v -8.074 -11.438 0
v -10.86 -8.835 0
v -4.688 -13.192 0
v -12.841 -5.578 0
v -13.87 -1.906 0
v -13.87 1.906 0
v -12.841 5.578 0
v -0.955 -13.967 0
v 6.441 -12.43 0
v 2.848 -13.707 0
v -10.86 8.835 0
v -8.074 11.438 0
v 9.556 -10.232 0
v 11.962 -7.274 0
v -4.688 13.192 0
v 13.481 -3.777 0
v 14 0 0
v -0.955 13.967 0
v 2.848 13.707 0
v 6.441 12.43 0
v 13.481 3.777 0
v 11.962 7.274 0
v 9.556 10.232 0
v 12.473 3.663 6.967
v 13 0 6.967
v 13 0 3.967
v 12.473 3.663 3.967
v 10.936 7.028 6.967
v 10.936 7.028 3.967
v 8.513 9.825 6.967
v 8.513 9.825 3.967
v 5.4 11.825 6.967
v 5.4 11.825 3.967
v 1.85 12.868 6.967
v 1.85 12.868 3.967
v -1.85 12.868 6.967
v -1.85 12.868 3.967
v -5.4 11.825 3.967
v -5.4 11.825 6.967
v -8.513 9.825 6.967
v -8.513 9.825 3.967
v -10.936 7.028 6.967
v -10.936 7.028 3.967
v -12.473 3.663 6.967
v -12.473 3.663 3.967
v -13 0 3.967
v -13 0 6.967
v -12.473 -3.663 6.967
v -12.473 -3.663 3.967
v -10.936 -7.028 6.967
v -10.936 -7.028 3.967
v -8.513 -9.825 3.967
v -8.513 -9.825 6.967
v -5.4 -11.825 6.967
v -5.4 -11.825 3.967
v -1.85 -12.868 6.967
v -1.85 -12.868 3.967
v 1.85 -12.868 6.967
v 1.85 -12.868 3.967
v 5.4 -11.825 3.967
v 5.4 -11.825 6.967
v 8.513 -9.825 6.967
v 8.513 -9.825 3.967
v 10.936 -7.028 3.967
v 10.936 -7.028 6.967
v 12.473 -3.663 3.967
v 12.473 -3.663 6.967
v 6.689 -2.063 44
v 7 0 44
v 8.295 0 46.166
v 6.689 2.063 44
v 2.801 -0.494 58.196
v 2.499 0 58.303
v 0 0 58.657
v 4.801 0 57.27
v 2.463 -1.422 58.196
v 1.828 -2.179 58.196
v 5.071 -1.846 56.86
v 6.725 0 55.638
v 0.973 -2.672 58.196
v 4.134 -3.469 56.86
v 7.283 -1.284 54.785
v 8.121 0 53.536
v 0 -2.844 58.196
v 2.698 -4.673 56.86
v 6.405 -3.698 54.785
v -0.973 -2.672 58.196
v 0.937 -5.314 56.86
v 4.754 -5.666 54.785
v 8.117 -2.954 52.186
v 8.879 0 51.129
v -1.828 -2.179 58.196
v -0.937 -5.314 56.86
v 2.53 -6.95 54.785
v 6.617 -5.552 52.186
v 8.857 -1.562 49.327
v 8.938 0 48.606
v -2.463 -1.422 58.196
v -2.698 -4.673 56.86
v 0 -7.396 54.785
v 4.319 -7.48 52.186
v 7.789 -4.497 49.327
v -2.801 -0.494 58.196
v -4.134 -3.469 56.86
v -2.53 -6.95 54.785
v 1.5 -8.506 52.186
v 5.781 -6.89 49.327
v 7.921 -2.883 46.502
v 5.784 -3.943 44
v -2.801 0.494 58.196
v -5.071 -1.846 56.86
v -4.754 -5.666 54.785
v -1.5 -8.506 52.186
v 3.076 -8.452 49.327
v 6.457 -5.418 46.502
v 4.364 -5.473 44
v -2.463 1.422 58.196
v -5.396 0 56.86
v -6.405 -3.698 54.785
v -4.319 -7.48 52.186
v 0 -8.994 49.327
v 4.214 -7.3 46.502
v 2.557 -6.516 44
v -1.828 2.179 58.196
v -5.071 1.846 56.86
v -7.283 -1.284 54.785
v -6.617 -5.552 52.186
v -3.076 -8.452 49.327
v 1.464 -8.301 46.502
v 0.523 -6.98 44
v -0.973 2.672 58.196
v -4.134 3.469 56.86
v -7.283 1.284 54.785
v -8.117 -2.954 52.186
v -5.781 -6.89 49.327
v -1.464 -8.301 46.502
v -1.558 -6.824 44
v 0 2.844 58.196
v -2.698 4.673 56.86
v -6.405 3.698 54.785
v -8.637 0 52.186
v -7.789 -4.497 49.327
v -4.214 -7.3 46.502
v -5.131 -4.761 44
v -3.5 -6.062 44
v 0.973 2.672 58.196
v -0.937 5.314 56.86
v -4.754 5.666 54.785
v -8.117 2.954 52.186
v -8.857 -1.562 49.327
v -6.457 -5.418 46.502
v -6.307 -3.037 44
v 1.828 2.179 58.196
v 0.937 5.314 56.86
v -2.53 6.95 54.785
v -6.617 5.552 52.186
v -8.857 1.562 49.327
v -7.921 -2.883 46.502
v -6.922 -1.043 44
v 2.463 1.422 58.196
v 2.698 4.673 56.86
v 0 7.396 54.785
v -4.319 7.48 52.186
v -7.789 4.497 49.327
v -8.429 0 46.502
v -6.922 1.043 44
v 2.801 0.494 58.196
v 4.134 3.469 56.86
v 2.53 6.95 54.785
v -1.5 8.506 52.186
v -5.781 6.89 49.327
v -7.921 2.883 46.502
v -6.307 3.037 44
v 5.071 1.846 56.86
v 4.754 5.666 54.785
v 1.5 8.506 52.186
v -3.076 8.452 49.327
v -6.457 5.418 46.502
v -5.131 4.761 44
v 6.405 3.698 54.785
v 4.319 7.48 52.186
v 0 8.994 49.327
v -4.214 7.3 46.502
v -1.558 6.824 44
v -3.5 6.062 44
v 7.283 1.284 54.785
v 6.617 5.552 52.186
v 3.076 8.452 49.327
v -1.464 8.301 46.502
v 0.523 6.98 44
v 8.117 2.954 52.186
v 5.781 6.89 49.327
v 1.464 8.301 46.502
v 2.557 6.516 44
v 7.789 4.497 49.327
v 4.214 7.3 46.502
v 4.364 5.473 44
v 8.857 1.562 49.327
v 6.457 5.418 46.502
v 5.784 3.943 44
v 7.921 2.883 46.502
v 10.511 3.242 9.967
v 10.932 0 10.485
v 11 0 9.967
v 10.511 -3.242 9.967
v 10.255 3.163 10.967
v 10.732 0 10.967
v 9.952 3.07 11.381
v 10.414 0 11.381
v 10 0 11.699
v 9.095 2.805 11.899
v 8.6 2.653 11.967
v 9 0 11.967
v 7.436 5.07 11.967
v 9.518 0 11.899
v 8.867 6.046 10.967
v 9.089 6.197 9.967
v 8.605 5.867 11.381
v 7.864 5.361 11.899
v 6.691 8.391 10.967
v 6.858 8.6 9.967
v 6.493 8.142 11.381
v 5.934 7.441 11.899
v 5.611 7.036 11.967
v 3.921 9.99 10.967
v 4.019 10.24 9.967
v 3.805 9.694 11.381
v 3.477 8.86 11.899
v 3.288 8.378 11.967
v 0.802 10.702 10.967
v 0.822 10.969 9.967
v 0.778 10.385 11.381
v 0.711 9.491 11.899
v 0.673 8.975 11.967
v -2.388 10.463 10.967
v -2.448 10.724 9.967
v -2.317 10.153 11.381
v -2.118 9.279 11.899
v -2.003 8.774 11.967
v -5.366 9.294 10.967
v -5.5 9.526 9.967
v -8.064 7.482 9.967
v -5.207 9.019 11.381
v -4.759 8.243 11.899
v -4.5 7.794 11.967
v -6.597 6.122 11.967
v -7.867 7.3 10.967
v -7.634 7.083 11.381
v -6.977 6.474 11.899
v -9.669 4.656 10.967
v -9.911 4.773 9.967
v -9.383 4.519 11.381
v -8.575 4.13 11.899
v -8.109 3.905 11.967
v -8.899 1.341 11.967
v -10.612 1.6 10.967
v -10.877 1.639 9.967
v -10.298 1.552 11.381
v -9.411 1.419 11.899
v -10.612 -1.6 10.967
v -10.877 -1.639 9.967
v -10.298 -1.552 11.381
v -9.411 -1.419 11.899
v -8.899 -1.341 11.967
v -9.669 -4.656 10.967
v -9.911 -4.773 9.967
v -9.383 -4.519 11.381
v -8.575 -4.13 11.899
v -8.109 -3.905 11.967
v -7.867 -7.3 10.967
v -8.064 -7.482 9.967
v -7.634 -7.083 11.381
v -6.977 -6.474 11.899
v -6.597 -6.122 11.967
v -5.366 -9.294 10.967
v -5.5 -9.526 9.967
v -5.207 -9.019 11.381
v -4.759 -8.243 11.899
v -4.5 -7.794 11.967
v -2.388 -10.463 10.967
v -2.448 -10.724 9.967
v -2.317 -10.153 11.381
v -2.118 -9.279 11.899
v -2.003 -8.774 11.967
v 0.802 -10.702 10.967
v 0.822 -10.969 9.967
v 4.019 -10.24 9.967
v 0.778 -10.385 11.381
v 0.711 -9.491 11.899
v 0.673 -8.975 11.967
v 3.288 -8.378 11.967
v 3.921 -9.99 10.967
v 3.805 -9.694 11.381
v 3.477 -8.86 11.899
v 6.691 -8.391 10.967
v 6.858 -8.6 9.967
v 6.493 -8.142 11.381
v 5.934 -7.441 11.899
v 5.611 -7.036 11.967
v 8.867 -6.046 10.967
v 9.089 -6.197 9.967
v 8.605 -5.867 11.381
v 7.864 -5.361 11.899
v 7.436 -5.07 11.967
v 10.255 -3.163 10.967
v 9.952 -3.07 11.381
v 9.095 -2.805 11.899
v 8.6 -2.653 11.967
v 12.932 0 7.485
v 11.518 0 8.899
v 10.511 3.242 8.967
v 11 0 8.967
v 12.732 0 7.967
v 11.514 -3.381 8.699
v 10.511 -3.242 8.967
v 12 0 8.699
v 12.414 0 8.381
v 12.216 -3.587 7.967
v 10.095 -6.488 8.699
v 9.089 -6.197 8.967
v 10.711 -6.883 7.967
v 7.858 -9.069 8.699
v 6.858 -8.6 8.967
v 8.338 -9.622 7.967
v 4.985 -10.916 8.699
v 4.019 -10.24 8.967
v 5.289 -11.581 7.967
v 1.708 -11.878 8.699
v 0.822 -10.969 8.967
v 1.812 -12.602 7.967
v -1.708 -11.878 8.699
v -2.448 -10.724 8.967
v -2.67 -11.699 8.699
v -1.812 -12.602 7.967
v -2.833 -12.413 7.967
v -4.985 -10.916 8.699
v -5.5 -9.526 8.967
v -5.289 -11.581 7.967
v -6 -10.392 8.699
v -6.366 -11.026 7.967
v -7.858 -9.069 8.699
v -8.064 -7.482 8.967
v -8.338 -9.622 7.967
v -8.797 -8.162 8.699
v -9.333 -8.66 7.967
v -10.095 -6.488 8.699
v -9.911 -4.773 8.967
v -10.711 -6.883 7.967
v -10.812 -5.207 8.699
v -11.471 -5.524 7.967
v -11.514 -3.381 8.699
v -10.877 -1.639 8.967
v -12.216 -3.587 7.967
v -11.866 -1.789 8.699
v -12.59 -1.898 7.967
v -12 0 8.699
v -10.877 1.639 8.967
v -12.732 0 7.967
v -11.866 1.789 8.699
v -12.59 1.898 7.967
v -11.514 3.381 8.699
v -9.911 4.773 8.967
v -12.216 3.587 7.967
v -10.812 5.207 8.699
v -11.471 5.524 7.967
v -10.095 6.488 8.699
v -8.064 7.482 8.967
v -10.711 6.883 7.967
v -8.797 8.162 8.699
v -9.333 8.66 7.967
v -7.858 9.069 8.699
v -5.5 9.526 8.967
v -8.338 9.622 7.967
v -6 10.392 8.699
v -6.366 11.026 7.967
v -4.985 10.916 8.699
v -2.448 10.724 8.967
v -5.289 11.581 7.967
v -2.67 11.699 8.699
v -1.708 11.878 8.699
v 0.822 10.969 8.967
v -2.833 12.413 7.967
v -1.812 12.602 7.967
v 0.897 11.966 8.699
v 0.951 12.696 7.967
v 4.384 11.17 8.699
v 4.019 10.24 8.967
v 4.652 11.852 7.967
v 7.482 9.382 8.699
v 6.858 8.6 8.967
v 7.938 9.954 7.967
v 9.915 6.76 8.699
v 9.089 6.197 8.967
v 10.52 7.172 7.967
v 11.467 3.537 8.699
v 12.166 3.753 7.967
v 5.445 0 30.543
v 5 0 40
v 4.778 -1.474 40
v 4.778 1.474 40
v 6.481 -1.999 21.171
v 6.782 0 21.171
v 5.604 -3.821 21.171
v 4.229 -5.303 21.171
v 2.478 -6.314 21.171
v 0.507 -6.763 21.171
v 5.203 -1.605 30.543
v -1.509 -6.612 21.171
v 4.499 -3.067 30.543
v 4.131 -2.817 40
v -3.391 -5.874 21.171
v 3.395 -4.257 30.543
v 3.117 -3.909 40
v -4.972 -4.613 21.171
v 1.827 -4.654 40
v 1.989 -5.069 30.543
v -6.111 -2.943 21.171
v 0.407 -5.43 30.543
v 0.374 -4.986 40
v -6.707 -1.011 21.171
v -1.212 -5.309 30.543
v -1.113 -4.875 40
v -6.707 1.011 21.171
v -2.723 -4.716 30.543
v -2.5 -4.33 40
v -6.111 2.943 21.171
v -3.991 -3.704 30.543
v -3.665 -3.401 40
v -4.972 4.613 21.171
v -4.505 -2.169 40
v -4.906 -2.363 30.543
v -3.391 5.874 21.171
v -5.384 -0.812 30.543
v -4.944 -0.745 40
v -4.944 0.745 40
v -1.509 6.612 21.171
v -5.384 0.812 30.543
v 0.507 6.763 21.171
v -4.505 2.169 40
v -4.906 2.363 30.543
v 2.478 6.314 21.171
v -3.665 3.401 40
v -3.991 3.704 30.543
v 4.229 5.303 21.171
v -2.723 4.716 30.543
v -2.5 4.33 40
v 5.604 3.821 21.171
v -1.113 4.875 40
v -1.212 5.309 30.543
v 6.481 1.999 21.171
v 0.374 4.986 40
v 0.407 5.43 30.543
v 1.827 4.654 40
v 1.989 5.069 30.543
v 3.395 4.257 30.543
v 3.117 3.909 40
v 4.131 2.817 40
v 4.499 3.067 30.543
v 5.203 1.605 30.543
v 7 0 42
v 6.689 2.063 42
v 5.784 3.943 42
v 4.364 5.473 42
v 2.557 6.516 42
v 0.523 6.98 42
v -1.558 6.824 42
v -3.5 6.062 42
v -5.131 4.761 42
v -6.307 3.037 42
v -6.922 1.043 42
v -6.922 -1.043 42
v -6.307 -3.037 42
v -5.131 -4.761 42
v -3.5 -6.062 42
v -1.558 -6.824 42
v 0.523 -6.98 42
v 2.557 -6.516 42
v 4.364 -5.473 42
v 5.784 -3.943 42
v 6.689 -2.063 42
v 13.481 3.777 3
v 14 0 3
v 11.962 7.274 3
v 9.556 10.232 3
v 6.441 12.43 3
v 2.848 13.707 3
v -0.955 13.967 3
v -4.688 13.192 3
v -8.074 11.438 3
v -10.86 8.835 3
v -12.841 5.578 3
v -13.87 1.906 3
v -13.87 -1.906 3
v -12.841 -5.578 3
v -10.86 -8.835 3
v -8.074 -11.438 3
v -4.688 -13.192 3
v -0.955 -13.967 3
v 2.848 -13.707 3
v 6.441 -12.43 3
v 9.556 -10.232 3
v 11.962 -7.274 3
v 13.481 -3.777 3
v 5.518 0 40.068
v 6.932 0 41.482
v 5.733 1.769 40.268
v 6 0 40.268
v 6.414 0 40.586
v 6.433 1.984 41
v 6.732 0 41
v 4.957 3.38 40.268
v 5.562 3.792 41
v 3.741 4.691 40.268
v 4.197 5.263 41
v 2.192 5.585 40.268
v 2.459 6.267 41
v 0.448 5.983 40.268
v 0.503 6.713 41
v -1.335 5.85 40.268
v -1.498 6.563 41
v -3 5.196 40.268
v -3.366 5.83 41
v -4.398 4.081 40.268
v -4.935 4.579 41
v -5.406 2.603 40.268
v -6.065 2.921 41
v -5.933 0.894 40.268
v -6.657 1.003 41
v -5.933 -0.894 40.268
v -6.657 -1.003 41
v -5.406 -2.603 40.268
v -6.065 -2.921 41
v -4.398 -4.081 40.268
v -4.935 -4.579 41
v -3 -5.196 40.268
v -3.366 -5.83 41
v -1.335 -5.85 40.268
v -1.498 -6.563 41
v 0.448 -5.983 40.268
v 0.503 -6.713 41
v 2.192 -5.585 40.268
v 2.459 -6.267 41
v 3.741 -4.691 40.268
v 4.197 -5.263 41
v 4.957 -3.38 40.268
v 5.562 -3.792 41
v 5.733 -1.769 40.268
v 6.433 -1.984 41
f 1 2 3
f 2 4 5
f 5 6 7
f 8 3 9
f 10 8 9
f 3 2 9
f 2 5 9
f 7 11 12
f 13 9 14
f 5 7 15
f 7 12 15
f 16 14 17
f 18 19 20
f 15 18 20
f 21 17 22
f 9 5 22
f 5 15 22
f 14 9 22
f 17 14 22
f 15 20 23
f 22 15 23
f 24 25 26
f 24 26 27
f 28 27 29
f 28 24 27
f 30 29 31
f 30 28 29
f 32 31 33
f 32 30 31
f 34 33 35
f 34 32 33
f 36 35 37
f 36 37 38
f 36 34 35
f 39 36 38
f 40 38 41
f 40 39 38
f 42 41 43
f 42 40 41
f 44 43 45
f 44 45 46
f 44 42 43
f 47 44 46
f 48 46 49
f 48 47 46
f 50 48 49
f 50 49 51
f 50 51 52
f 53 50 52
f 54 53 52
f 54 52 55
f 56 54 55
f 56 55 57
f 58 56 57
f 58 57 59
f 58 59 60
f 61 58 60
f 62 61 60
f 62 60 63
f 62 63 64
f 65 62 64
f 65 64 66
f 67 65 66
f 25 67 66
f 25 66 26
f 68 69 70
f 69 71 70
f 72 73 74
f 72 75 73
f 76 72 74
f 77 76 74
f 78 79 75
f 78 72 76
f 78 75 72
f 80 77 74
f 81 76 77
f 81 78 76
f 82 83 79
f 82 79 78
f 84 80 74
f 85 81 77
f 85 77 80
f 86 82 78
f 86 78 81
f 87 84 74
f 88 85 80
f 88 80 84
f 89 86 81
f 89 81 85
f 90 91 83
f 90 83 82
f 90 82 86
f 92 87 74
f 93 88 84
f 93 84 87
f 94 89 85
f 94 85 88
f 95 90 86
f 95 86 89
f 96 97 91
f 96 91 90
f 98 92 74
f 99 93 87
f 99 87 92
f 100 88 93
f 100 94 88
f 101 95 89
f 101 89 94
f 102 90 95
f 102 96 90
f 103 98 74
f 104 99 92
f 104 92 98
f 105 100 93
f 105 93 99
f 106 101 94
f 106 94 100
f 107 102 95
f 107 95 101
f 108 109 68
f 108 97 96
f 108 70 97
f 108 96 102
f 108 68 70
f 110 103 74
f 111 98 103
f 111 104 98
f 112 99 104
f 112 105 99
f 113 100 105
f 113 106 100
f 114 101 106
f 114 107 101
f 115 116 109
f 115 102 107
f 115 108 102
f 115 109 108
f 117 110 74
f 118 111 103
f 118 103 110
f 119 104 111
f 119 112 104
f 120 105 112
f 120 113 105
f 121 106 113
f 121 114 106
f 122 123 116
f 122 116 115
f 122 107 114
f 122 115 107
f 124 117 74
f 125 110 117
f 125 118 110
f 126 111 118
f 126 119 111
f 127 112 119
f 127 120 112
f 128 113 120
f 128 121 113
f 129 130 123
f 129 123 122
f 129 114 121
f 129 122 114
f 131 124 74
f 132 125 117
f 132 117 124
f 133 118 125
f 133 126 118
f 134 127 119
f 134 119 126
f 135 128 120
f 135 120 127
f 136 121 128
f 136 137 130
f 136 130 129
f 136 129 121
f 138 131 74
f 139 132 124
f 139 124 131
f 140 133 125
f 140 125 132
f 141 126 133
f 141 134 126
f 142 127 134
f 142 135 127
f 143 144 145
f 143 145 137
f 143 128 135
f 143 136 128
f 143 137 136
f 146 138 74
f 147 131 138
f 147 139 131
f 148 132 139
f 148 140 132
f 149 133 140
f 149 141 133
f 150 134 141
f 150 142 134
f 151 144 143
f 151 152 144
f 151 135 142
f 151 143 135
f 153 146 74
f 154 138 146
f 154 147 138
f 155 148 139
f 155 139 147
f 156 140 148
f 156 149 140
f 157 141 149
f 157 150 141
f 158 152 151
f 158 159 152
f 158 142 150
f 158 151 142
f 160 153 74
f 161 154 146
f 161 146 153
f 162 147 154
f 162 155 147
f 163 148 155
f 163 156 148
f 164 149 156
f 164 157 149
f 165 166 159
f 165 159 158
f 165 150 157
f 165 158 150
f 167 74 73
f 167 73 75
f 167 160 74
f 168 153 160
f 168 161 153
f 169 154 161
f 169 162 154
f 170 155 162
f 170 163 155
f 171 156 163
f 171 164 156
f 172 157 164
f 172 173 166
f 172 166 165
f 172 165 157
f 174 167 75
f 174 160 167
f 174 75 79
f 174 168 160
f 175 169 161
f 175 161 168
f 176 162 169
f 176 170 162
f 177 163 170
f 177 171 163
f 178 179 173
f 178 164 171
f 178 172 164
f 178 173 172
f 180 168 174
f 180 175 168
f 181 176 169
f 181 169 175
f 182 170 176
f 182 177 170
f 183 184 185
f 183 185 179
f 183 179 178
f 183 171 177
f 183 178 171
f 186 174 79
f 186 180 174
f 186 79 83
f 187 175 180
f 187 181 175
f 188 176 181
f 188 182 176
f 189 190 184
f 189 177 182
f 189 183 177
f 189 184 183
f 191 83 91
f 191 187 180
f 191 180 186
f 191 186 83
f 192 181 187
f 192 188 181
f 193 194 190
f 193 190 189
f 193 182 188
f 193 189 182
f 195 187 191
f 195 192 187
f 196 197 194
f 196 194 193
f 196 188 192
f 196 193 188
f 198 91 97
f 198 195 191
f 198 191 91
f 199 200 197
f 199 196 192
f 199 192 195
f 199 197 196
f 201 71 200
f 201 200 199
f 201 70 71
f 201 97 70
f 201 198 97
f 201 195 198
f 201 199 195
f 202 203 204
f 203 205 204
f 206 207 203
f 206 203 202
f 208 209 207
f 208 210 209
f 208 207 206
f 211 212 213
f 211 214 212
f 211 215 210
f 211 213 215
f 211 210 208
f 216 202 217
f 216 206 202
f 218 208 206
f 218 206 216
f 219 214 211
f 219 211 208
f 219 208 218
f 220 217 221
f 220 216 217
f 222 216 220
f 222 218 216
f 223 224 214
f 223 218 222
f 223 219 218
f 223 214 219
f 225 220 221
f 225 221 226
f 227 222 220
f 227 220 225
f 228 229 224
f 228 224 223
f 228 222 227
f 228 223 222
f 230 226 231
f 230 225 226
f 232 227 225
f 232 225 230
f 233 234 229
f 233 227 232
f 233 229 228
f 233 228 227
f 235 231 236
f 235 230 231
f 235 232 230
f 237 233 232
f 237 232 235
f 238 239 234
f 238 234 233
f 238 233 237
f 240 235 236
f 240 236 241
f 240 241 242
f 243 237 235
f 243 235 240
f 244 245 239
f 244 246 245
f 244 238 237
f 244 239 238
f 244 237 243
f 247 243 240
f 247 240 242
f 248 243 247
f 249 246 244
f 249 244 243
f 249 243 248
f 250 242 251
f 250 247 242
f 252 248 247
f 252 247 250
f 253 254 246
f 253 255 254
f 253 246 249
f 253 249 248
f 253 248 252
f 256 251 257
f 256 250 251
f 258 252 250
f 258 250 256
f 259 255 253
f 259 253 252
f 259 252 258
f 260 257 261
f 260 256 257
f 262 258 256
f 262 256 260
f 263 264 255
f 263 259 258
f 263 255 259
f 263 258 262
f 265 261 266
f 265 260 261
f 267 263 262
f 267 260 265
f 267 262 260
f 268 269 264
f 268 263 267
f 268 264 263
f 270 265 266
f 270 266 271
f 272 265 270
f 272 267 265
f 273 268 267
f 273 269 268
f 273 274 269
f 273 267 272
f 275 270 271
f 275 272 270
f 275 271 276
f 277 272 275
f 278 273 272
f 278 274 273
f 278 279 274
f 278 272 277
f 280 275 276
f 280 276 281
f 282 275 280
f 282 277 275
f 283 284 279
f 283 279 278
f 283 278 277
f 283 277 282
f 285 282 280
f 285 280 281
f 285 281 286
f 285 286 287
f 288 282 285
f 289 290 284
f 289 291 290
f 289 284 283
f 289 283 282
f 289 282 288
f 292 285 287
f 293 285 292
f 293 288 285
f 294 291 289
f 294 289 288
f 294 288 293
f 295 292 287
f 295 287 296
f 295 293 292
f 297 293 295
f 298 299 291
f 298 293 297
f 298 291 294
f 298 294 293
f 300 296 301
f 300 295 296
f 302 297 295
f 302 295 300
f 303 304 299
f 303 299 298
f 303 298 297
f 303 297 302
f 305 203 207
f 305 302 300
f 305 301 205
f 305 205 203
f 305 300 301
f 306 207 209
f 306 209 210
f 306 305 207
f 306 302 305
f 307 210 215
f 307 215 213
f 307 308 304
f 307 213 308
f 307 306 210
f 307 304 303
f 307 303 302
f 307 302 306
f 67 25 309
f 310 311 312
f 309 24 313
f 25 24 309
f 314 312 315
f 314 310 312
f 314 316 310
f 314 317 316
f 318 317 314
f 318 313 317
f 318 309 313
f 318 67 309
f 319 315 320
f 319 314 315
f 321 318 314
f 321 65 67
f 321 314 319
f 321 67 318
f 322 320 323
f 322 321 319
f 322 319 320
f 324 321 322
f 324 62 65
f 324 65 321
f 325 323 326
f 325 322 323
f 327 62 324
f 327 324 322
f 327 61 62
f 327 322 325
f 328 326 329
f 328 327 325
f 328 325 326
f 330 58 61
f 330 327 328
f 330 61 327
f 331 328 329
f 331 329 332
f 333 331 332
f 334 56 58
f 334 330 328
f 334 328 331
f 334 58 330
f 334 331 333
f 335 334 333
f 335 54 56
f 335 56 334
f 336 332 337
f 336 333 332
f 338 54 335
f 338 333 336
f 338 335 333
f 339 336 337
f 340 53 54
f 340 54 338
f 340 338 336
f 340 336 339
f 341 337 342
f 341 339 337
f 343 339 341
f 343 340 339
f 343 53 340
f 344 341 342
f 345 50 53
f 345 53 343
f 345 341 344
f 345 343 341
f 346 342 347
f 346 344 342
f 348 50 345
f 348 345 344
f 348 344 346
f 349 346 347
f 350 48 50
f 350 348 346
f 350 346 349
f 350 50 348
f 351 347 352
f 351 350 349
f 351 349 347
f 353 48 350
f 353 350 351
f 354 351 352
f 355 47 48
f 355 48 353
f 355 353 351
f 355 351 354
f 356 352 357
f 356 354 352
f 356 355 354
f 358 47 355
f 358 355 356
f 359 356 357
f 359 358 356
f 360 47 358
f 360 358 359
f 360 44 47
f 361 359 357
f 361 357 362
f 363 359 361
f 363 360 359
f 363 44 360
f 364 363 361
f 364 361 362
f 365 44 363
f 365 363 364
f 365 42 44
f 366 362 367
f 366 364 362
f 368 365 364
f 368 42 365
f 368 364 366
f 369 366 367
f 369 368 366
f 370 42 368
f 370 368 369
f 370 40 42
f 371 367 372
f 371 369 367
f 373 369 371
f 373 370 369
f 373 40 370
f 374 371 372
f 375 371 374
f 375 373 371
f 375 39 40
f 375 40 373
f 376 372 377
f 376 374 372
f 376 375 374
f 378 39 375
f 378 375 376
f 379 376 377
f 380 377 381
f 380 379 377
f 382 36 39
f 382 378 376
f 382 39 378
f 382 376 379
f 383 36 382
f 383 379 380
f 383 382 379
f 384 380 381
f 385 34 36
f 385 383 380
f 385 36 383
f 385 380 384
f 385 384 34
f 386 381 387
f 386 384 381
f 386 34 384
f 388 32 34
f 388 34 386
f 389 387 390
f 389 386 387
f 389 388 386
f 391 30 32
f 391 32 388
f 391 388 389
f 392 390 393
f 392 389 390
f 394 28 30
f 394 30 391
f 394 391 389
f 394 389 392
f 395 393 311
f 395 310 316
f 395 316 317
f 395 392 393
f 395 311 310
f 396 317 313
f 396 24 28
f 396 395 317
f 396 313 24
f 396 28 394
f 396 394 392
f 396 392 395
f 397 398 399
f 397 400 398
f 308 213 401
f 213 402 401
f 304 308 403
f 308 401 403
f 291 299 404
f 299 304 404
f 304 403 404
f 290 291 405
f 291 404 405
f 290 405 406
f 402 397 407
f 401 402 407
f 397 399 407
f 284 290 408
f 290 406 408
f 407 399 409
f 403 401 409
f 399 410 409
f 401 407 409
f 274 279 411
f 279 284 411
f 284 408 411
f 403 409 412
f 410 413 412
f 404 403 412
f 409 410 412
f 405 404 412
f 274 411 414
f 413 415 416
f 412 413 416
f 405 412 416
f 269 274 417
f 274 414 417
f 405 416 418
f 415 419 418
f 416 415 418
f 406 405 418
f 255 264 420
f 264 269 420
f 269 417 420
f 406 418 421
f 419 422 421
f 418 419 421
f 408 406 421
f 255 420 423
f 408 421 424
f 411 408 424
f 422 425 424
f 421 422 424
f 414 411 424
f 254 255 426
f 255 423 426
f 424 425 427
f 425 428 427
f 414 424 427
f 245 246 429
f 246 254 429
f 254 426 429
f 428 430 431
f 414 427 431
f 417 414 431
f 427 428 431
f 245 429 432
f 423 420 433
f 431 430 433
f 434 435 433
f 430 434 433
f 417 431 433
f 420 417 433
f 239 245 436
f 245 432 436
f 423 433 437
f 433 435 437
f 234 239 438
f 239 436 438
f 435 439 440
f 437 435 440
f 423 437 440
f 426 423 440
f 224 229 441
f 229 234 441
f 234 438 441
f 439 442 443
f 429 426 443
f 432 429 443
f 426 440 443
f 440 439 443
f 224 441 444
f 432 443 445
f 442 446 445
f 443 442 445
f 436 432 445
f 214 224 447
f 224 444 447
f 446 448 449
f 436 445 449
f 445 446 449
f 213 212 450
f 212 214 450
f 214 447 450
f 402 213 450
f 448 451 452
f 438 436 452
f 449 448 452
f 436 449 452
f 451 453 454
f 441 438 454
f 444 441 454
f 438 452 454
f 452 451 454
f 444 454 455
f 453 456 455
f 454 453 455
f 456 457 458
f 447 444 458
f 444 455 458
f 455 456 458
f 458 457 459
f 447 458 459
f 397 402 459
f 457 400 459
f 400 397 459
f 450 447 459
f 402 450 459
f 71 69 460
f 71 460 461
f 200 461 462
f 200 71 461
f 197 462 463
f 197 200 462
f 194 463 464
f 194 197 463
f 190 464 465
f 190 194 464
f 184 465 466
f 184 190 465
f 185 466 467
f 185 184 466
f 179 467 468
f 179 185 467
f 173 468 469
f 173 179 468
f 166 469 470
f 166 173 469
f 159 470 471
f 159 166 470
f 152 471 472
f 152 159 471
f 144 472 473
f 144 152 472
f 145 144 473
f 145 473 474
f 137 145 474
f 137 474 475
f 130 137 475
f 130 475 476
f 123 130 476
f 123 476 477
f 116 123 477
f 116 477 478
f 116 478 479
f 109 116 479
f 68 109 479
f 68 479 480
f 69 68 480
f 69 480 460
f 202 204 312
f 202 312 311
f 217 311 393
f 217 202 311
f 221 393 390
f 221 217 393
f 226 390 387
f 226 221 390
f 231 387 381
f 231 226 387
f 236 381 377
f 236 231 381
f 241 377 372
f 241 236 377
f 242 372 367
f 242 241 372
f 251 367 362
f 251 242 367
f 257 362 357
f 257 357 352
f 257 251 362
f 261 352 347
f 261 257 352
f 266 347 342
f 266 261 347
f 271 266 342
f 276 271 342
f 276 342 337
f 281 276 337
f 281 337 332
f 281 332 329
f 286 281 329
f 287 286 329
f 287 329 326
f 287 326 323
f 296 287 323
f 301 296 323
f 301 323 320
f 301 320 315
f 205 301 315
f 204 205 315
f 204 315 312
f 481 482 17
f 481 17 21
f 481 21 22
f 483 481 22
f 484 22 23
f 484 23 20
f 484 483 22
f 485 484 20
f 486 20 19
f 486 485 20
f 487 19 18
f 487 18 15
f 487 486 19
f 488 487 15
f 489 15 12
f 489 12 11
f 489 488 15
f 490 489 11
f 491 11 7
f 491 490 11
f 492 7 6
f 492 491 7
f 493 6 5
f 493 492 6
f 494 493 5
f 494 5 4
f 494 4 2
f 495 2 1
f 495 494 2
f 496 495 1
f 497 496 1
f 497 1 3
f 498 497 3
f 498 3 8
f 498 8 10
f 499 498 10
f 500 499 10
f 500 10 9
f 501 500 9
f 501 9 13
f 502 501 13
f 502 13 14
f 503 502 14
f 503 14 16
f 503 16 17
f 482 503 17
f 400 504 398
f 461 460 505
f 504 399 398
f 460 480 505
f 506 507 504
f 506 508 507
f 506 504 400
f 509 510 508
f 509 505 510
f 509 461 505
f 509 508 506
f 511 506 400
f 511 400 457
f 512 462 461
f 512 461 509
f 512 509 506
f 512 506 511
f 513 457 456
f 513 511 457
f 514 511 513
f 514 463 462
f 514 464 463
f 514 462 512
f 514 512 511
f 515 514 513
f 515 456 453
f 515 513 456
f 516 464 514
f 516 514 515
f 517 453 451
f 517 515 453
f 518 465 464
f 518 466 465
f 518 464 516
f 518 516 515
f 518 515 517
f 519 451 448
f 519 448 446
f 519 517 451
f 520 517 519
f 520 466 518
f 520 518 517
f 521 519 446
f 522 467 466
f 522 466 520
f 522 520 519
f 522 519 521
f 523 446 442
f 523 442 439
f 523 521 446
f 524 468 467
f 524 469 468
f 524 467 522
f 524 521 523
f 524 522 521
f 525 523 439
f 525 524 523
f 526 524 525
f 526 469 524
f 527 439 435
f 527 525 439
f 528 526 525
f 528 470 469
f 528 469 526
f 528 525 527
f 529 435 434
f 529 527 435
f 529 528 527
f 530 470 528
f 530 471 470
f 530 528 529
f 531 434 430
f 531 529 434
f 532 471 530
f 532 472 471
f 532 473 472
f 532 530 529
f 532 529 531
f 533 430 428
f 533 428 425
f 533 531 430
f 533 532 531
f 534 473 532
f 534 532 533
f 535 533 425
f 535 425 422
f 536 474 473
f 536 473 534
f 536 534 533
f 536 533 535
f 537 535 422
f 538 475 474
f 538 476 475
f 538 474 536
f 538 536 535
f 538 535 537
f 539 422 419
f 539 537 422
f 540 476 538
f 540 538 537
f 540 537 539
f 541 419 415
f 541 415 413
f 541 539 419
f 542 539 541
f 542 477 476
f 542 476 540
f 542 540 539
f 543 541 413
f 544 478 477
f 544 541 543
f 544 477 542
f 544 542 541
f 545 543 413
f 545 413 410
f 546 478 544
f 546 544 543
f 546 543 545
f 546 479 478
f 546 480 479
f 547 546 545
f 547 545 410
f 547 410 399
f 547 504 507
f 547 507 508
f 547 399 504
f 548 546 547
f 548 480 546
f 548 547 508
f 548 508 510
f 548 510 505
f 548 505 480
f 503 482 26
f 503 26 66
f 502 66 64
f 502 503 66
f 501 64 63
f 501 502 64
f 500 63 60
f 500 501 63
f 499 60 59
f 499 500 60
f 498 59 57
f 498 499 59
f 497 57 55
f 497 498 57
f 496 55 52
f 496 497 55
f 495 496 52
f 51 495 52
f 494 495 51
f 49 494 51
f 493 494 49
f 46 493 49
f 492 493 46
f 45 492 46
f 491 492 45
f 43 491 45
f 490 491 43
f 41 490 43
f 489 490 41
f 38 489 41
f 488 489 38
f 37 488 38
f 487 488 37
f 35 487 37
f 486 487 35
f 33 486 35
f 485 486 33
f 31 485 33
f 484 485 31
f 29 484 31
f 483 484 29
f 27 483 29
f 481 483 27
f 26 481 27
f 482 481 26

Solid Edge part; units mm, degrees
sketch "Sketch1" plane through (0, 0, 0) normal (0, -1, 0) x (1, 0, 0)
  arc A0 (11, 8.967) -> (13, 6.967) centre (11, 6.967) cw
  line L0 (13, 3.967) -> (13, 6.967)
  line L1 (13, 3.967) -> (14, 3)
  line L2 (14, 0) -> (14, 3)
  line L3 (0, 0) -> (14, 0)
  line L4 (0, 0) -> (0, 58.6569)
  line L5 (7, 42) -> (7, 44)
  arc A1 (5, 40) -> (7, 42) centre (5, 42) ccw
  arc A2 (11, 9.967) -> (9, 11.967) centre (9, 9.967) ccw
  line L6 (11, 8.967) -> (11, 9.967)
  arc A3 (0, 58.6569) -> (7, 44) centre (0, 49.6569) cw
  arc A4 (9, 11.967) -> (5, 40) centre (105, 39.9671) cw
revolve "RevolvedProtrusion1" add sketch "Sketch1" angle 360 about axis through (0, 0, 0) along (0, 0, 1)
